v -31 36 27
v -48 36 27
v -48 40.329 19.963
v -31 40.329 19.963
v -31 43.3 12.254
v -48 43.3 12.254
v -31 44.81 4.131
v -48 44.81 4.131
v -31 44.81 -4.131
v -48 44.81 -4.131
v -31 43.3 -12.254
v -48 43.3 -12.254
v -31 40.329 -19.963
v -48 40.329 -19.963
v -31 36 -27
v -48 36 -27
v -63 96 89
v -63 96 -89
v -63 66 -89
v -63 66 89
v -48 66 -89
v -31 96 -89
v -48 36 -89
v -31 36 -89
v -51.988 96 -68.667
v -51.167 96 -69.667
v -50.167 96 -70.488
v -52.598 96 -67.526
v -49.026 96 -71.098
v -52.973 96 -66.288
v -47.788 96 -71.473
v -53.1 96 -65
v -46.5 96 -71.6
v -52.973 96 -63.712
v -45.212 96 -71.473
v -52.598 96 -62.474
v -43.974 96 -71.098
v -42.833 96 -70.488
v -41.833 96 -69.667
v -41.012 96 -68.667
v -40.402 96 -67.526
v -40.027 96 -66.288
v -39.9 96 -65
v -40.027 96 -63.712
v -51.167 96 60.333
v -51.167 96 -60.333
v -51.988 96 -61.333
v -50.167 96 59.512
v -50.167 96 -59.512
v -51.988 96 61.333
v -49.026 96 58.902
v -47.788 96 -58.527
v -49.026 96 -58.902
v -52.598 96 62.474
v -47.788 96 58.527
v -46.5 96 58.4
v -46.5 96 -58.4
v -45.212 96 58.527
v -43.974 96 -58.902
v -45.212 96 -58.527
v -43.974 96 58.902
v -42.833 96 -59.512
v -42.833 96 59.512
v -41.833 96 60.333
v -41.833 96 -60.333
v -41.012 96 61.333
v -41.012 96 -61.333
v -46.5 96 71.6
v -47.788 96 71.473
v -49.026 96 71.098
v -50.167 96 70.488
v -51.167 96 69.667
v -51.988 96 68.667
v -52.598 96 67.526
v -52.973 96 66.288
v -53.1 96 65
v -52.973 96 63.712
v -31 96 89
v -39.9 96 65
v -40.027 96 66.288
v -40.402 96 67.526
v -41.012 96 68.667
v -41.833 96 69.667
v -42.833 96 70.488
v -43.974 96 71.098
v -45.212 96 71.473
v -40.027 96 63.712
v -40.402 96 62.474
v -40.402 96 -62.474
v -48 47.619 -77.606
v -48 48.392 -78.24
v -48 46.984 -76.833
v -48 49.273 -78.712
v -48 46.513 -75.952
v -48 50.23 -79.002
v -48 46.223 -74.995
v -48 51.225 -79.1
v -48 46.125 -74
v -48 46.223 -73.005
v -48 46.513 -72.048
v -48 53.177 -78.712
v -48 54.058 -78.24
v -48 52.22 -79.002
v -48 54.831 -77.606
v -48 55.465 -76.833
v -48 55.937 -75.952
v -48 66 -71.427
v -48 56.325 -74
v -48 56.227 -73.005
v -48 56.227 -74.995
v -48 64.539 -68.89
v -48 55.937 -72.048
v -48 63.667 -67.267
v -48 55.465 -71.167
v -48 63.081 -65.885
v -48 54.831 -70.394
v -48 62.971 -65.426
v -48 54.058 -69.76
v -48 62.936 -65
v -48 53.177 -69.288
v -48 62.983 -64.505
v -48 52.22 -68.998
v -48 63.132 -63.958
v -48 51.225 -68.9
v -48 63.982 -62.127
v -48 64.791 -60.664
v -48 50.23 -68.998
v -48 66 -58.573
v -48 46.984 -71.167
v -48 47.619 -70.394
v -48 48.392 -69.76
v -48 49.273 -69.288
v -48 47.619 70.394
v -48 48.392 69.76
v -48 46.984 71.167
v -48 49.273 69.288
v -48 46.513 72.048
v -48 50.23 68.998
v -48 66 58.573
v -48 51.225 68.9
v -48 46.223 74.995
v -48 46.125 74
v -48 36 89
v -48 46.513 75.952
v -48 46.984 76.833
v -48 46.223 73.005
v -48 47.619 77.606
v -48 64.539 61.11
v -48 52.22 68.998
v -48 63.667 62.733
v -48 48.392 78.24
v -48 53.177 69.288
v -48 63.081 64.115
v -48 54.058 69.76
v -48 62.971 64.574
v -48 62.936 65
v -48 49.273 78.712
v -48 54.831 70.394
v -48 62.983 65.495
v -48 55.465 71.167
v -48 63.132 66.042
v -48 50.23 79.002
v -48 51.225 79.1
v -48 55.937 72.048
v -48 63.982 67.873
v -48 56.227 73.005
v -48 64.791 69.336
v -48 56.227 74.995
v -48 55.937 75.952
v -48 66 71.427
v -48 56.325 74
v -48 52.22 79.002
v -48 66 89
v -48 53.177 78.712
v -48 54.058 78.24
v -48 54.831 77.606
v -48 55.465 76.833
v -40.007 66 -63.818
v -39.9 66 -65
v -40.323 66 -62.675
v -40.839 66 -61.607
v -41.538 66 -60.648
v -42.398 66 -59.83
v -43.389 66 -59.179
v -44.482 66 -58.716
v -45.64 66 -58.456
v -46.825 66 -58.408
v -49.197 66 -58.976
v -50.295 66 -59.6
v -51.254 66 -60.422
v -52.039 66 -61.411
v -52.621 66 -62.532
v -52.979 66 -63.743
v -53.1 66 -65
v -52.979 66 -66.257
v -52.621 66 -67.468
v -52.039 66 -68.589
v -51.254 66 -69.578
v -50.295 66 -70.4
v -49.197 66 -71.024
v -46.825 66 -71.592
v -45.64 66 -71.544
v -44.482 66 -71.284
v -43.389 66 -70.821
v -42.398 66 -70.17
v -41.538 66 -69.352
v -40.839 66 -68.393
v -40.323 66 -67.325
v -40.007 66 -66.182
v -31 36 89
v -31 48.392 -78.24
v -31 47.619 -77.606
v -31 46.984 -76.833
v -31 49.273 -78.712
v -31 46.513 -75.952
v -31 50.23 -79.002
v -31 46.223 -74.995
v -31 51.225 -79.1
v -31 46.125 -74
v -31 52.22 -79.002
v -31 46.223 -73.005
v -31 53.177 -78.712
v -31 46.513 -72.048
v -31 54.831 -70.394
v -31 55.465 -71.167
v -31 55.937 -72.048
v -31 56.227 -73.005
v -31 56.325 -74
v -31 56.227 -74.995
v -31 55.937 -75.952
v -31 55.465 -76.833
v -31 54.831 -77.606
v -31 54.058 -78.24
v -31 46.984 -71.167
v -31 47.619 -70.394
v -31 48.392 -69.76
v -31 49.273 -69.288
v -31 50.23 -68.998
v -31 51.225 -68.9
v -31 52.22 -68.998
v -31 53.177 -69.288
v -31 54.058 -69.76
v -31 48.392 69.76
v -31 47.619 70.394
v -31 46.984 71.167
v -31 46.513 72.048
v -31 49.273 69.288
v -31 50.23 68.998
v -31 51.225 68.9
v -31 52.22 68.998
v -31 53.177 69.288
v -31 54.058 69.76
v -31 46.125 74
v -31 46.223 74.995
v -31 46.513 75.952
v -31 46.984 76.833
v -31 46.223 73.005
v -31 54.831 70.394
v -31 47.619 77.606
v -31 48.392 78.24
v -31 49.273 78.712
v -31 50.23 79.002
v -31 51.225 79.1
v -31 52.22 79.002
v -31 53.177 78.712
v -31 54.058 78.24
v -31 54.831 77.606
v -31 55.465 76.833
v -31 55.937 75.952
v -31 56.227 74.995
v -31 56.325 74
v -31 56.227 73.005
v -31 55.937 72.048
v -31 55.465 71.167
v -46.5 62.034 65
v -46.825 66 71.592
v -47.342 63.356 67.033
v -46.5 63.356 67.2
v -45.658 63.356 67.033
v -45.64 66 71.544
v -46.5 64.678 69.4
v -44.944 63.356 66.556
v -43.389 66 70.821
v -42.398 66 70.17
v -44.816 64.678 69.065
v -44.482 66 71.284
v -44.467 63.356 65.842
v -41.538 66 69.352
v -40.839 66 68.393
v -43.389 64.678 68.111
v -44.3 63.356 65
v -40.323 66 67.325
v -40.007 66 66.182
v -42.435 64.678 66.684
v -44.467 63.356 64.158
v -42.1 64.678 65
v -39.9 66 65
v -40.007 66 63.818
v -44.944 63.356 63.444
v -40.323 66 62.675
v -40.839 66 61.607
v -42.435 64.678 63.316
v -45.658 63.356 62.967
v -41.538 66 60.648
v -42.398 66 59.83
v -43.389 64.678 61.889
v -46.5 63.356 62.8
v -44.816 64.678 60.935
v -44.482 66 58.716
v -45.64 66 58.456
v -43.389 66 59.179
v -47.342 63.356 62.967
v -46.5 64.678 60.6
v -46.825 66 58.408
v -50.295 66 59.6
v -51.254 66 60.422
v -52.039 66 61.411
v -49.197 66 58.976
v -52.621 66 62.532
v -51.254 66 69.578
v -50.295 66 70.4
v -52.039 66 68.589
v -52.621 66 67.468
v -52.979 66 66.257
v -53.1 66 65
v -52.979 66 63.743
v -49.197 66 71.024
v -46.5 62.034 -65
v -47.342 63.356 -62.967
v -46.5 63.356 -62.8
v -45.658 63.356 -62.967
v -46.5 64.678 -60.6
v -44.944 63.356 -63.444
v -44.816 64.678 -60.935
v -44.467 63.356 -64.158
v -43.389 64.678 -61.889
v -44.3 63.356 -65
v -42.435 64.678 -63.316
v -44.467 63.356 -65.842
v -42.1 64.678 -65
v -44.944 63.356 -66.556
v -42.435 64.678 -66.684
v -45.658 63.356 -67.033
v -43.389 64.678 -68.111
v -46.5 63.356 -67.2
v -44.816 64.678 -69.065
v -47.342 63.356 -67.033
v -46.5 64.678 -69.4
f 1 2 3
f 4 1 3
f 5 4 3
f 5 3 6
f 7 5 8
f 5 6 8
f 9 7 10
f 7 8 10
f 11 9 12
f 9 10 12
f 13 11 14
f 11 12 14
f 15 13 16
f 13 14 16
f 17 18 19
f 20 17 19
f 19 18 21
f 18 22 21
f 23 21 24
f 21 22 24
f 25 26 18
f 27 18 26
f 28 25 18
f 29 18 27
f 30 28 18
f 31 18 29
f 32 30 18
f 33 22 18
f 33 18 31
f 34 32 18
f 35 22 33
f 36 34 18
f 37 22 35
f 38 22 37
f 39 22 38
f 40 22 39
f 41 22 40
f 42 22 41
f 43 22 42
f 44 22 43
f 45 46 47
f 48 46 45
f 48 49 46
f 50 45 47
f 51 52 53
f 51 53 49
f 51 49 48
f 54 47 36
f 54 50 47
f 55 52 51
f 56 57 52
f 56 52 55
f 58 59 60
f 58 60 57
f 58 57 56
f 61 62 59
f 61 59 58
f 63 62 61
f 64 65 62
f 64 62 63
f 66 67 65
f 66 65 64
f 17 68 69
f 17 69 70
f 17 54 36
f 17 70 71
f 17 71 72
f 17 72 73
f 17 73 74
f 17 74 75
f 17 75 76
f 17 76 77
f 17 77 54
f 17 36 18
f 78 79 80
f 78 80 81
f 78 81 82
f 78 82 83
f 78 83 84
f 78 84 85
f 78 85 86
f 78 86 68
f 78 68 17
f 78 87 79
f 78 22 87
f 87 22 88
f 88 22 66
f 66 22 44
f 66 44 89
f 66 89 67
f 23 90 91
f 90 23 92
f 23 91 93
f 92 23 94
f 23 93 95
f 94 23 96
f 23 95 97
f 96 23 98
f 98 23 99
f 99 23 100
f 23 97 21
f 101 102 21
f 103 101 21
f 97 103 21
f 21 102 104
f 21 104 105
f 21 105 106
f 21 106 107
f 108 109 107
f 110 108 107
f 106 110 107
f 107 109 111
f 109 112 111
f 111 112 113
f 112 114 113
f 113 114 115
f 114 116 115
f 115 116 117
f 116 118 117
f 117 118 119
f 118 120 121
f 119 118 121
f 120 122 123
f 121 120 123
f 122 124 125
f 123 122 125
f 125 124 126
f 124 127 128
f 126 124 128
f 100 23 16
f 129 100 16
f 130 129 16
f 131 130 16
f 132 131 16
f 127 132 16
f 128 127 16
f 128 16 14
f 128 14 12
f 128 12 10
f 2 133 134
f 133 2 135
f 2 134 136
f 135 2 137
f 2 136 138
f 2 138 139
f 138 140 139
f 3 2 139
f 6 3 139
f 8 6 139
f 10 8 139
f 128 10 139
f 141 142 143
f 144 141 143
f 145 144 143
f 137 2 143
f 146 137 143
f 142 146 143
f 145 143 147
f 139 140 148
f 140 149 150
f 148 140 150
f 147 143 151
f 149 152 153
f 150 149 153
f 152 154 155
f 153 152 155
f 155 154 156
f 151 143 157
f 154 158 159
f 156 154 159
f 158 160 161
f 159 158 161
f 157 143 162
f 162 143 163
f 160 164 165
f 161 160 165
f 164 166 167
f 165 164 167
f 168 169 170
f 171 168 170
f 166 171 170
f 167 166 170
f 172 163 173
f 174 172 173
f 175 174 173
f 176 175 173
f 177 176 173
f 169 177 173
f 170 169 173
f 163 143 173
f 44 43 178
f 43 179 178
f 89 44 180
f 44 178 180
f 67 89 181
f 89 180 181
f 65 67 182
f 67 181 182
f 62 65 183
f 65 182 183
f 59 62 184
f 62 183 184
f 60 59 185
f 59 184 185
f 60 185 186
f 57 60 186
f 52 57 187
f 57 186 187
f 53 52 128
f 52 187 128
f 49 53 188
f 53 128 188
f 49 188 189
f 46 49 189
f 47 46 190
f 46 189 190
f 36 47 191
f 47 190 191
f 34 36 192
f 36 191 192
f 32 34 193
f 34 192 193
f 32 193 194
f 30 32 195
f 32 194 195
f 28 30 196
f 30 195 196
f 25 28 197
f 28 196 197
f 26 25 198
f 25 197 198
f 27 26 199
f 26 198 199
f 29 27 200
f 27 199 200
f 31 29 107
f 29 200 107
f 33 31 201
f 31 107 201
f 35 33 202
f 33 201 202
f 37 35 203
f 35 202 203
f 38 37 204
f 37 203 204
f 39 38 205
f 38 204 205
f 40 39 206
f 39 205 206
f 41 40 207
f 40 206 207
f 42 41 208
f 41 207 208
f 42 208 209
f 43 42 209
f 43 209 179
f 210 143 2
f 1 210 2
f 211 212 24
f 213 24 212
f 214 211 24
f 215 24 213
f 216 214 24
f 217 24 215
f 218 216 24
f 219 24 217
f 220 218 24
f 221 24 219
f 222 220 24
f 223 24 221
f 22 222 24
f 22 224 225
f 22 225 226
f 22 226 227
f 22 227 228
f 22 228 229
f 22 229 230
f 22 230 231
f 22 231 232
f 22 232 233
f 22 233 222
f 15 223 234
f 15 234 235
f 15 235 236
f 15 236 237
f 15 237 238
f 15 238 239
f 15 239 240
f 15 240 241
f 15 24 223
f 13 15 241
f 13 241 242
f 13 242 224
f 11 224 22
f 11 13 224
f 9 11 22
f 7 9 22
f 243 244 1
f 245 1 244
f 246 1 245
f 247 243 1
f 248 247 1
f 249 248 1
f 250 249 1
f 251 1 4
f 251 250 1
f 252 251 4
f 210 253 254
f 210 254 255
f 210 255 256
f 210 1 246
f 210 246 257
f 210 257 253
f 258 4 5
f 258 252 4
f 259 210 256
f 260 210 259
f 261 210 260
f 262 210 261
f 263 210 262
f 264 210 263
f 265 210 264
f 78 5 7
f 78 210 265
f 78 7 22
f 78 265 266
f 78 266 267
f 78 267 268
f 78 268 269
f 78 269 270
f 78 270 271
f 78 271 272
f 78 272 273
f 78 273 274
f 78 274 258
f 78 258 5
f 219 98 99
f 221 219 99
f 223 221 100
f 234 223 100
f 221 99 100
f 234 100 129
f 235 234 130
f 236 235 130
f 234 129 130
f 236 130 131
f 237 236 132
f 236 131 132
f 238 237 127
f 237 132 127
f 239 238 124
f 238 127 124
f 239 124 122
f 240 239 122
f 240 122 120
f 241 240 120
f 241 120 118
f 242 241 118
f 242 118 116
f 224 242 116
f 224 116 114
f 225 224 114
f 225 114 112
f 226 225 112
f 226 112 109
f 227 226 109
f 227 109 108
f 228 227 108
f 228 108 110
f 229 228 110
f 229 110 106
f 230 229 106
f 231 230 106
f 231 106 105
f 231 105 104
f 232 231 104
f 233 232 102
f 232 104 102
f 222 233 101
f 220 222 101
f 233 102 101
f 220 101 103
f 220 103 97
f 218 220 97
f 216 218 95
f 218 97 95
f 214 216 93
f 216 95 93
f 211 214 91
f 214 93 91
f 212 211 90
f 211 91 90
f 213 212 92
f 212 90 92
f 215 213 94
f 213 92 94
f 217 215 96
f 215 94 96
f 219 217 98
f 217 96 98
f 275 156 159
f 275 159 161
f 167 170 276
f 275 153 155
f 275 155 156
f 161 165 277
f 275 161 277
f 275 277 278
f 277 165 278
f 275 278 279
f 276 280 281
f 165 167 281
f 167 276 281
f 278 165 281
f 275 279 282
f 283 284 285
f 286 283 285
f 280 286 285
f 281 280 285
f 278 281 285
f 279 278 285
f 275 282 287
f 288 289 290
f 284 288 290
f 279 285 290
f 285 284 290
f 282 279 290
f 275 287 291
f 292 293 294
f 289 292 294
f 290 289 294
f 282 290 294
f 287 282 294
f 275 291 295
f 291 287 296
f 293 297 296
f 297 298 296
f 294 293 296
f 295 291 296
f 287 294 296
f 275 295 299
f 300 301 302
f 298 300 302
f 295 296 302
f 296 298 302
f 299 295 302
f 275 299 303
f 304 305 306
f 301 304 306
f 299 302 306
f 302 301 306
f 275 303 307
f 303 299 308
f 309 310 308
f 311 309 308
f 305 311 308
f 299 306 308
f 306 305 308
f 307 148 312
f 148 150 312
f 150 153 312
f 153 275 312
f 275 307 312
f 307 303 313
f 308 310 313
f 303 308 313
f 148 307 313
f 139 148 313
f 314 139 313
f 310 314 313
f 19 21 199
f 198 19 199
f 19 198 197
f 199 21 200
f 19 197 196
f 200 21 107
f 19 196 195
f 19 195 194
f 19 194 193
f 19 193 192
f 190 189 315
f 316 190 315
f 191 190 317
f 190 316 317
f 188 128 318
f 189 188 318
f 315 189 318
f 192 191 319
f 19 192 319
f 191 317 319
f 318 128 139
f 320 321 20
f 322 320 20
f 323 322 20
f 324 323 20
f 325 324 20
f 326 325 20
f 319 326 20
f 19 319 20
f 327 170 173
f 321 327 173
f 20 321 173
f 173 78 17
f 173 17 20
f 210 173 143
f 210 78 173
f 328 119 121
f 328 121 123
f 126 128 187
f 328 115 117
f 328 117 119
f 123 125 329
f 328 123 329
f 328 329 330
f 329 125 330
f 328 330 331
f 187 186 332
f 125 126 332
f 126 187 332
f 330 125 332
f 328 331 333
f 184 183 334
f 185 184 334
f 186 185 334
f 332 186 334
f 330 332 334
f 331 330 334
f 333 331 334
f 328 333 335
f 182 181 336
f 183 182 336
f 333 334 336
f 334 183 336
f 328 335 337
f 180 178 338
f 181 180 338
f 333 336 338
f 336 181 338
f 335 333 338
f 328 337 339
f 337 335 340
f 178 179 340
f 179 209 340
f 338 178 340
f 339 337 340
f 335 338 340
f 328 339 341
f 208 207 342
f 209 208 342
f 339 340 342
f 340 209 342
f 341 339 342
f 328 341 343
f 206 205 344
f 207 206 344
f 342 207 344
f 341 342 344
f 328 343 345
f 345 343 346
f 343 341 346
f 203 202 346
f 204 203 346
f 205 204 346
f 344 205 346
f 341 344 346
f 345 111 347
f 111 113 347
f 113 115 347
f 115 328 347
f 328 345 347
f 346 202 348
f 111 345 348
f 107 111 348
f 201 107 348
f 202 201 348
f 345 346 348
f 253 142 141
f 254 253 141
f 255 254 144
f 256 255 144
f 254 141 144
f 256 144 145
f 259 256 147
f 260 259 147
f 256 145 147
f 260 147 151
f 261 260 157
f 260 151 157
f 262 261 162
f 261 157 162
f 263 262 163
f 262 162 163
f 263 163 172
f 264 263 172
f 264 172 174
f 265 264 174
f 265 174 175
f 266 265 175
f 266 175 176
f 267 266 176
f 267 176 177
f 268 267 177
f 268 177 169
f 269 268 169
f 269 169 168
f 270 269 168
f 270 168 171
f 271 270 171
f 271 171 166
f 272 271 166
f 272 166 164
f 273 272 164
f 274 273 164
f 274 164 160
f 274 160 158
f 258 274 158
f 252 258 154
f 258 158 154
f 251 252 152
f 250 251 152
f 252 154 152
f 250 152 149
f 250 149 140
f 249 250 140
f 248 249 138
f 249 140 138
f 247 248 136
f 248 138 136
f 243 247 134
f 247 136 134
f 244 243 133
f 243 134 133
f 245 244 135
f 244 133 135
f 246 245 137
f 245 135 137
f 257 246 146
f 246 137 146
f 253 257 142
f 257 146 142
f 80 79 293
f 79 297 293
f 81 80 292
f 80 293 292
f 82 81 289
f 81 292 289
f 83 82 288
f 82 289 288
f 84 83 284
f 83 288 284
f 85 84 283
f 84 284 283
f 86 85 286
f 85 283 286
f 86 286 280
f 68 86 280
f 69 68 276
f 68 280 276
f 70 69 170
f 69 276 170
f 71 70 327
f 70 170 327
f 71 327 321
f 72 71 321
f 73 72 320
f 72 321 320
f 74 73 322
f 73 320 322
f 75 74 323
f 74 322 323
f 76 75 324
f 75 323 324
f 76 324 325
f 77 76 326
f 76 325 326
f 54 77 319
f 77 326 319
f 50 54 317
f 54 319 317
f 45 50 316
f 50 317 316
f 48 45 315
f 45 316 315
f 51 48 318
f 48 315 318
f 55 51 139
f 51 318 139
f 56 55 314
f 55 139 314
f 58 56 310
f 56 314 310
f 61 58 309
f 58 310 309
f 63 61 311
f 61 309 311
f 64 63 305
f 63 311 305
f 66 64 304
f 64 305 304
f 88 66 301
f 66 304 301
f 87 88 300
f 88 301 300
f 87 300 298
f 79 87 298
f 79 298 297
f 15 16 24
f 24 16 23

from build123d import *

# Parameters (mm, degrees)
F4_R      = 5
F5_DEPTH  = 17
F7_W      = 30
F7_H      = 178
F8_DEPTH  = 15
F10_D     = 10.2
F10_DEPTH = 80
F10_START = 31
F10_TIP   = 3.064389157
F11_D     = 13.2
F11_DEPTH = 30
F11_TIP   = 3.9656800856


with BuildPart() as f5:
    # F4 (on offset) → F5 (new body)
    with BuildSketch(Plane.YZ.offset(-48)):
        with BuildLine():
            Line((36, 89), (36, 27))
            ThreePointArc((36, 27), (45, 0), (36, -27))
            Line((36, -27), (36, -89))
            Line((36, -89), (96, -89))
            Line((96, -89), (96, 89))
            Line((96, 89), (36, 89))
        make_face()
        with Locations((51.2249938995, -74)):
            Circle(F4_R, mode=Mode.SUBTRACT)
        with Locations((51.2249938995, 74)):
            Circle(F4_R, mode=Mode.SUBTRACT)
        with Locations((51.2249938995, 74)):
            Circle(F4_R)
        with Locations((51.2249938995, -74)):
            Circle(F4_R)
    extrude(amount=F5_DEPTH)

    # F7 (on face) → F8 (join)
    with BuildSketch(Plane(origin=(-48, 0, 0), x_dir=(0, -1, 0), z_dir=(-1, 0, 0))):
        with Locations((-81, 0)):
            Rectangle(F7_W, F7_H)
    extrude(amount=F8_DEPTH)

    # F10
    # its depths count from where the whole tool has entered the part; down to there all is cleared
    with Locations(Plane.YZ.offset(-F10_START)):
        with Locations((51.2249938995, 74), (51.2249938995, -74)):
            Hole(F10_D / 2, depth=F10_DEPTH)
            with Locations((0, 0, -(F10_DEPTH + F10_TIP / 2))):  # 118° drill point
                Cone(0, F10_D / 2, F10_TIP, mode=Mode.SUBTRACT)

    # F11
    with Locations(Plane(origin=(0, 96, 0), x_dir=(-1, 0, 0), z_dir=(0, 1, 0))):
        with Locations((46.5, 65), (46.5, -65)):
            Hole(F11_D / 2, depth=F11_DEPTH)
            with Locations((0, 0, -(F11_DEPTH + F11_TIP / 2))):  # 118° drill point
                Cone(0, F11_D / 2, F11_TIP, mode=Mode.SUBTRACT)


solid = f5.part
